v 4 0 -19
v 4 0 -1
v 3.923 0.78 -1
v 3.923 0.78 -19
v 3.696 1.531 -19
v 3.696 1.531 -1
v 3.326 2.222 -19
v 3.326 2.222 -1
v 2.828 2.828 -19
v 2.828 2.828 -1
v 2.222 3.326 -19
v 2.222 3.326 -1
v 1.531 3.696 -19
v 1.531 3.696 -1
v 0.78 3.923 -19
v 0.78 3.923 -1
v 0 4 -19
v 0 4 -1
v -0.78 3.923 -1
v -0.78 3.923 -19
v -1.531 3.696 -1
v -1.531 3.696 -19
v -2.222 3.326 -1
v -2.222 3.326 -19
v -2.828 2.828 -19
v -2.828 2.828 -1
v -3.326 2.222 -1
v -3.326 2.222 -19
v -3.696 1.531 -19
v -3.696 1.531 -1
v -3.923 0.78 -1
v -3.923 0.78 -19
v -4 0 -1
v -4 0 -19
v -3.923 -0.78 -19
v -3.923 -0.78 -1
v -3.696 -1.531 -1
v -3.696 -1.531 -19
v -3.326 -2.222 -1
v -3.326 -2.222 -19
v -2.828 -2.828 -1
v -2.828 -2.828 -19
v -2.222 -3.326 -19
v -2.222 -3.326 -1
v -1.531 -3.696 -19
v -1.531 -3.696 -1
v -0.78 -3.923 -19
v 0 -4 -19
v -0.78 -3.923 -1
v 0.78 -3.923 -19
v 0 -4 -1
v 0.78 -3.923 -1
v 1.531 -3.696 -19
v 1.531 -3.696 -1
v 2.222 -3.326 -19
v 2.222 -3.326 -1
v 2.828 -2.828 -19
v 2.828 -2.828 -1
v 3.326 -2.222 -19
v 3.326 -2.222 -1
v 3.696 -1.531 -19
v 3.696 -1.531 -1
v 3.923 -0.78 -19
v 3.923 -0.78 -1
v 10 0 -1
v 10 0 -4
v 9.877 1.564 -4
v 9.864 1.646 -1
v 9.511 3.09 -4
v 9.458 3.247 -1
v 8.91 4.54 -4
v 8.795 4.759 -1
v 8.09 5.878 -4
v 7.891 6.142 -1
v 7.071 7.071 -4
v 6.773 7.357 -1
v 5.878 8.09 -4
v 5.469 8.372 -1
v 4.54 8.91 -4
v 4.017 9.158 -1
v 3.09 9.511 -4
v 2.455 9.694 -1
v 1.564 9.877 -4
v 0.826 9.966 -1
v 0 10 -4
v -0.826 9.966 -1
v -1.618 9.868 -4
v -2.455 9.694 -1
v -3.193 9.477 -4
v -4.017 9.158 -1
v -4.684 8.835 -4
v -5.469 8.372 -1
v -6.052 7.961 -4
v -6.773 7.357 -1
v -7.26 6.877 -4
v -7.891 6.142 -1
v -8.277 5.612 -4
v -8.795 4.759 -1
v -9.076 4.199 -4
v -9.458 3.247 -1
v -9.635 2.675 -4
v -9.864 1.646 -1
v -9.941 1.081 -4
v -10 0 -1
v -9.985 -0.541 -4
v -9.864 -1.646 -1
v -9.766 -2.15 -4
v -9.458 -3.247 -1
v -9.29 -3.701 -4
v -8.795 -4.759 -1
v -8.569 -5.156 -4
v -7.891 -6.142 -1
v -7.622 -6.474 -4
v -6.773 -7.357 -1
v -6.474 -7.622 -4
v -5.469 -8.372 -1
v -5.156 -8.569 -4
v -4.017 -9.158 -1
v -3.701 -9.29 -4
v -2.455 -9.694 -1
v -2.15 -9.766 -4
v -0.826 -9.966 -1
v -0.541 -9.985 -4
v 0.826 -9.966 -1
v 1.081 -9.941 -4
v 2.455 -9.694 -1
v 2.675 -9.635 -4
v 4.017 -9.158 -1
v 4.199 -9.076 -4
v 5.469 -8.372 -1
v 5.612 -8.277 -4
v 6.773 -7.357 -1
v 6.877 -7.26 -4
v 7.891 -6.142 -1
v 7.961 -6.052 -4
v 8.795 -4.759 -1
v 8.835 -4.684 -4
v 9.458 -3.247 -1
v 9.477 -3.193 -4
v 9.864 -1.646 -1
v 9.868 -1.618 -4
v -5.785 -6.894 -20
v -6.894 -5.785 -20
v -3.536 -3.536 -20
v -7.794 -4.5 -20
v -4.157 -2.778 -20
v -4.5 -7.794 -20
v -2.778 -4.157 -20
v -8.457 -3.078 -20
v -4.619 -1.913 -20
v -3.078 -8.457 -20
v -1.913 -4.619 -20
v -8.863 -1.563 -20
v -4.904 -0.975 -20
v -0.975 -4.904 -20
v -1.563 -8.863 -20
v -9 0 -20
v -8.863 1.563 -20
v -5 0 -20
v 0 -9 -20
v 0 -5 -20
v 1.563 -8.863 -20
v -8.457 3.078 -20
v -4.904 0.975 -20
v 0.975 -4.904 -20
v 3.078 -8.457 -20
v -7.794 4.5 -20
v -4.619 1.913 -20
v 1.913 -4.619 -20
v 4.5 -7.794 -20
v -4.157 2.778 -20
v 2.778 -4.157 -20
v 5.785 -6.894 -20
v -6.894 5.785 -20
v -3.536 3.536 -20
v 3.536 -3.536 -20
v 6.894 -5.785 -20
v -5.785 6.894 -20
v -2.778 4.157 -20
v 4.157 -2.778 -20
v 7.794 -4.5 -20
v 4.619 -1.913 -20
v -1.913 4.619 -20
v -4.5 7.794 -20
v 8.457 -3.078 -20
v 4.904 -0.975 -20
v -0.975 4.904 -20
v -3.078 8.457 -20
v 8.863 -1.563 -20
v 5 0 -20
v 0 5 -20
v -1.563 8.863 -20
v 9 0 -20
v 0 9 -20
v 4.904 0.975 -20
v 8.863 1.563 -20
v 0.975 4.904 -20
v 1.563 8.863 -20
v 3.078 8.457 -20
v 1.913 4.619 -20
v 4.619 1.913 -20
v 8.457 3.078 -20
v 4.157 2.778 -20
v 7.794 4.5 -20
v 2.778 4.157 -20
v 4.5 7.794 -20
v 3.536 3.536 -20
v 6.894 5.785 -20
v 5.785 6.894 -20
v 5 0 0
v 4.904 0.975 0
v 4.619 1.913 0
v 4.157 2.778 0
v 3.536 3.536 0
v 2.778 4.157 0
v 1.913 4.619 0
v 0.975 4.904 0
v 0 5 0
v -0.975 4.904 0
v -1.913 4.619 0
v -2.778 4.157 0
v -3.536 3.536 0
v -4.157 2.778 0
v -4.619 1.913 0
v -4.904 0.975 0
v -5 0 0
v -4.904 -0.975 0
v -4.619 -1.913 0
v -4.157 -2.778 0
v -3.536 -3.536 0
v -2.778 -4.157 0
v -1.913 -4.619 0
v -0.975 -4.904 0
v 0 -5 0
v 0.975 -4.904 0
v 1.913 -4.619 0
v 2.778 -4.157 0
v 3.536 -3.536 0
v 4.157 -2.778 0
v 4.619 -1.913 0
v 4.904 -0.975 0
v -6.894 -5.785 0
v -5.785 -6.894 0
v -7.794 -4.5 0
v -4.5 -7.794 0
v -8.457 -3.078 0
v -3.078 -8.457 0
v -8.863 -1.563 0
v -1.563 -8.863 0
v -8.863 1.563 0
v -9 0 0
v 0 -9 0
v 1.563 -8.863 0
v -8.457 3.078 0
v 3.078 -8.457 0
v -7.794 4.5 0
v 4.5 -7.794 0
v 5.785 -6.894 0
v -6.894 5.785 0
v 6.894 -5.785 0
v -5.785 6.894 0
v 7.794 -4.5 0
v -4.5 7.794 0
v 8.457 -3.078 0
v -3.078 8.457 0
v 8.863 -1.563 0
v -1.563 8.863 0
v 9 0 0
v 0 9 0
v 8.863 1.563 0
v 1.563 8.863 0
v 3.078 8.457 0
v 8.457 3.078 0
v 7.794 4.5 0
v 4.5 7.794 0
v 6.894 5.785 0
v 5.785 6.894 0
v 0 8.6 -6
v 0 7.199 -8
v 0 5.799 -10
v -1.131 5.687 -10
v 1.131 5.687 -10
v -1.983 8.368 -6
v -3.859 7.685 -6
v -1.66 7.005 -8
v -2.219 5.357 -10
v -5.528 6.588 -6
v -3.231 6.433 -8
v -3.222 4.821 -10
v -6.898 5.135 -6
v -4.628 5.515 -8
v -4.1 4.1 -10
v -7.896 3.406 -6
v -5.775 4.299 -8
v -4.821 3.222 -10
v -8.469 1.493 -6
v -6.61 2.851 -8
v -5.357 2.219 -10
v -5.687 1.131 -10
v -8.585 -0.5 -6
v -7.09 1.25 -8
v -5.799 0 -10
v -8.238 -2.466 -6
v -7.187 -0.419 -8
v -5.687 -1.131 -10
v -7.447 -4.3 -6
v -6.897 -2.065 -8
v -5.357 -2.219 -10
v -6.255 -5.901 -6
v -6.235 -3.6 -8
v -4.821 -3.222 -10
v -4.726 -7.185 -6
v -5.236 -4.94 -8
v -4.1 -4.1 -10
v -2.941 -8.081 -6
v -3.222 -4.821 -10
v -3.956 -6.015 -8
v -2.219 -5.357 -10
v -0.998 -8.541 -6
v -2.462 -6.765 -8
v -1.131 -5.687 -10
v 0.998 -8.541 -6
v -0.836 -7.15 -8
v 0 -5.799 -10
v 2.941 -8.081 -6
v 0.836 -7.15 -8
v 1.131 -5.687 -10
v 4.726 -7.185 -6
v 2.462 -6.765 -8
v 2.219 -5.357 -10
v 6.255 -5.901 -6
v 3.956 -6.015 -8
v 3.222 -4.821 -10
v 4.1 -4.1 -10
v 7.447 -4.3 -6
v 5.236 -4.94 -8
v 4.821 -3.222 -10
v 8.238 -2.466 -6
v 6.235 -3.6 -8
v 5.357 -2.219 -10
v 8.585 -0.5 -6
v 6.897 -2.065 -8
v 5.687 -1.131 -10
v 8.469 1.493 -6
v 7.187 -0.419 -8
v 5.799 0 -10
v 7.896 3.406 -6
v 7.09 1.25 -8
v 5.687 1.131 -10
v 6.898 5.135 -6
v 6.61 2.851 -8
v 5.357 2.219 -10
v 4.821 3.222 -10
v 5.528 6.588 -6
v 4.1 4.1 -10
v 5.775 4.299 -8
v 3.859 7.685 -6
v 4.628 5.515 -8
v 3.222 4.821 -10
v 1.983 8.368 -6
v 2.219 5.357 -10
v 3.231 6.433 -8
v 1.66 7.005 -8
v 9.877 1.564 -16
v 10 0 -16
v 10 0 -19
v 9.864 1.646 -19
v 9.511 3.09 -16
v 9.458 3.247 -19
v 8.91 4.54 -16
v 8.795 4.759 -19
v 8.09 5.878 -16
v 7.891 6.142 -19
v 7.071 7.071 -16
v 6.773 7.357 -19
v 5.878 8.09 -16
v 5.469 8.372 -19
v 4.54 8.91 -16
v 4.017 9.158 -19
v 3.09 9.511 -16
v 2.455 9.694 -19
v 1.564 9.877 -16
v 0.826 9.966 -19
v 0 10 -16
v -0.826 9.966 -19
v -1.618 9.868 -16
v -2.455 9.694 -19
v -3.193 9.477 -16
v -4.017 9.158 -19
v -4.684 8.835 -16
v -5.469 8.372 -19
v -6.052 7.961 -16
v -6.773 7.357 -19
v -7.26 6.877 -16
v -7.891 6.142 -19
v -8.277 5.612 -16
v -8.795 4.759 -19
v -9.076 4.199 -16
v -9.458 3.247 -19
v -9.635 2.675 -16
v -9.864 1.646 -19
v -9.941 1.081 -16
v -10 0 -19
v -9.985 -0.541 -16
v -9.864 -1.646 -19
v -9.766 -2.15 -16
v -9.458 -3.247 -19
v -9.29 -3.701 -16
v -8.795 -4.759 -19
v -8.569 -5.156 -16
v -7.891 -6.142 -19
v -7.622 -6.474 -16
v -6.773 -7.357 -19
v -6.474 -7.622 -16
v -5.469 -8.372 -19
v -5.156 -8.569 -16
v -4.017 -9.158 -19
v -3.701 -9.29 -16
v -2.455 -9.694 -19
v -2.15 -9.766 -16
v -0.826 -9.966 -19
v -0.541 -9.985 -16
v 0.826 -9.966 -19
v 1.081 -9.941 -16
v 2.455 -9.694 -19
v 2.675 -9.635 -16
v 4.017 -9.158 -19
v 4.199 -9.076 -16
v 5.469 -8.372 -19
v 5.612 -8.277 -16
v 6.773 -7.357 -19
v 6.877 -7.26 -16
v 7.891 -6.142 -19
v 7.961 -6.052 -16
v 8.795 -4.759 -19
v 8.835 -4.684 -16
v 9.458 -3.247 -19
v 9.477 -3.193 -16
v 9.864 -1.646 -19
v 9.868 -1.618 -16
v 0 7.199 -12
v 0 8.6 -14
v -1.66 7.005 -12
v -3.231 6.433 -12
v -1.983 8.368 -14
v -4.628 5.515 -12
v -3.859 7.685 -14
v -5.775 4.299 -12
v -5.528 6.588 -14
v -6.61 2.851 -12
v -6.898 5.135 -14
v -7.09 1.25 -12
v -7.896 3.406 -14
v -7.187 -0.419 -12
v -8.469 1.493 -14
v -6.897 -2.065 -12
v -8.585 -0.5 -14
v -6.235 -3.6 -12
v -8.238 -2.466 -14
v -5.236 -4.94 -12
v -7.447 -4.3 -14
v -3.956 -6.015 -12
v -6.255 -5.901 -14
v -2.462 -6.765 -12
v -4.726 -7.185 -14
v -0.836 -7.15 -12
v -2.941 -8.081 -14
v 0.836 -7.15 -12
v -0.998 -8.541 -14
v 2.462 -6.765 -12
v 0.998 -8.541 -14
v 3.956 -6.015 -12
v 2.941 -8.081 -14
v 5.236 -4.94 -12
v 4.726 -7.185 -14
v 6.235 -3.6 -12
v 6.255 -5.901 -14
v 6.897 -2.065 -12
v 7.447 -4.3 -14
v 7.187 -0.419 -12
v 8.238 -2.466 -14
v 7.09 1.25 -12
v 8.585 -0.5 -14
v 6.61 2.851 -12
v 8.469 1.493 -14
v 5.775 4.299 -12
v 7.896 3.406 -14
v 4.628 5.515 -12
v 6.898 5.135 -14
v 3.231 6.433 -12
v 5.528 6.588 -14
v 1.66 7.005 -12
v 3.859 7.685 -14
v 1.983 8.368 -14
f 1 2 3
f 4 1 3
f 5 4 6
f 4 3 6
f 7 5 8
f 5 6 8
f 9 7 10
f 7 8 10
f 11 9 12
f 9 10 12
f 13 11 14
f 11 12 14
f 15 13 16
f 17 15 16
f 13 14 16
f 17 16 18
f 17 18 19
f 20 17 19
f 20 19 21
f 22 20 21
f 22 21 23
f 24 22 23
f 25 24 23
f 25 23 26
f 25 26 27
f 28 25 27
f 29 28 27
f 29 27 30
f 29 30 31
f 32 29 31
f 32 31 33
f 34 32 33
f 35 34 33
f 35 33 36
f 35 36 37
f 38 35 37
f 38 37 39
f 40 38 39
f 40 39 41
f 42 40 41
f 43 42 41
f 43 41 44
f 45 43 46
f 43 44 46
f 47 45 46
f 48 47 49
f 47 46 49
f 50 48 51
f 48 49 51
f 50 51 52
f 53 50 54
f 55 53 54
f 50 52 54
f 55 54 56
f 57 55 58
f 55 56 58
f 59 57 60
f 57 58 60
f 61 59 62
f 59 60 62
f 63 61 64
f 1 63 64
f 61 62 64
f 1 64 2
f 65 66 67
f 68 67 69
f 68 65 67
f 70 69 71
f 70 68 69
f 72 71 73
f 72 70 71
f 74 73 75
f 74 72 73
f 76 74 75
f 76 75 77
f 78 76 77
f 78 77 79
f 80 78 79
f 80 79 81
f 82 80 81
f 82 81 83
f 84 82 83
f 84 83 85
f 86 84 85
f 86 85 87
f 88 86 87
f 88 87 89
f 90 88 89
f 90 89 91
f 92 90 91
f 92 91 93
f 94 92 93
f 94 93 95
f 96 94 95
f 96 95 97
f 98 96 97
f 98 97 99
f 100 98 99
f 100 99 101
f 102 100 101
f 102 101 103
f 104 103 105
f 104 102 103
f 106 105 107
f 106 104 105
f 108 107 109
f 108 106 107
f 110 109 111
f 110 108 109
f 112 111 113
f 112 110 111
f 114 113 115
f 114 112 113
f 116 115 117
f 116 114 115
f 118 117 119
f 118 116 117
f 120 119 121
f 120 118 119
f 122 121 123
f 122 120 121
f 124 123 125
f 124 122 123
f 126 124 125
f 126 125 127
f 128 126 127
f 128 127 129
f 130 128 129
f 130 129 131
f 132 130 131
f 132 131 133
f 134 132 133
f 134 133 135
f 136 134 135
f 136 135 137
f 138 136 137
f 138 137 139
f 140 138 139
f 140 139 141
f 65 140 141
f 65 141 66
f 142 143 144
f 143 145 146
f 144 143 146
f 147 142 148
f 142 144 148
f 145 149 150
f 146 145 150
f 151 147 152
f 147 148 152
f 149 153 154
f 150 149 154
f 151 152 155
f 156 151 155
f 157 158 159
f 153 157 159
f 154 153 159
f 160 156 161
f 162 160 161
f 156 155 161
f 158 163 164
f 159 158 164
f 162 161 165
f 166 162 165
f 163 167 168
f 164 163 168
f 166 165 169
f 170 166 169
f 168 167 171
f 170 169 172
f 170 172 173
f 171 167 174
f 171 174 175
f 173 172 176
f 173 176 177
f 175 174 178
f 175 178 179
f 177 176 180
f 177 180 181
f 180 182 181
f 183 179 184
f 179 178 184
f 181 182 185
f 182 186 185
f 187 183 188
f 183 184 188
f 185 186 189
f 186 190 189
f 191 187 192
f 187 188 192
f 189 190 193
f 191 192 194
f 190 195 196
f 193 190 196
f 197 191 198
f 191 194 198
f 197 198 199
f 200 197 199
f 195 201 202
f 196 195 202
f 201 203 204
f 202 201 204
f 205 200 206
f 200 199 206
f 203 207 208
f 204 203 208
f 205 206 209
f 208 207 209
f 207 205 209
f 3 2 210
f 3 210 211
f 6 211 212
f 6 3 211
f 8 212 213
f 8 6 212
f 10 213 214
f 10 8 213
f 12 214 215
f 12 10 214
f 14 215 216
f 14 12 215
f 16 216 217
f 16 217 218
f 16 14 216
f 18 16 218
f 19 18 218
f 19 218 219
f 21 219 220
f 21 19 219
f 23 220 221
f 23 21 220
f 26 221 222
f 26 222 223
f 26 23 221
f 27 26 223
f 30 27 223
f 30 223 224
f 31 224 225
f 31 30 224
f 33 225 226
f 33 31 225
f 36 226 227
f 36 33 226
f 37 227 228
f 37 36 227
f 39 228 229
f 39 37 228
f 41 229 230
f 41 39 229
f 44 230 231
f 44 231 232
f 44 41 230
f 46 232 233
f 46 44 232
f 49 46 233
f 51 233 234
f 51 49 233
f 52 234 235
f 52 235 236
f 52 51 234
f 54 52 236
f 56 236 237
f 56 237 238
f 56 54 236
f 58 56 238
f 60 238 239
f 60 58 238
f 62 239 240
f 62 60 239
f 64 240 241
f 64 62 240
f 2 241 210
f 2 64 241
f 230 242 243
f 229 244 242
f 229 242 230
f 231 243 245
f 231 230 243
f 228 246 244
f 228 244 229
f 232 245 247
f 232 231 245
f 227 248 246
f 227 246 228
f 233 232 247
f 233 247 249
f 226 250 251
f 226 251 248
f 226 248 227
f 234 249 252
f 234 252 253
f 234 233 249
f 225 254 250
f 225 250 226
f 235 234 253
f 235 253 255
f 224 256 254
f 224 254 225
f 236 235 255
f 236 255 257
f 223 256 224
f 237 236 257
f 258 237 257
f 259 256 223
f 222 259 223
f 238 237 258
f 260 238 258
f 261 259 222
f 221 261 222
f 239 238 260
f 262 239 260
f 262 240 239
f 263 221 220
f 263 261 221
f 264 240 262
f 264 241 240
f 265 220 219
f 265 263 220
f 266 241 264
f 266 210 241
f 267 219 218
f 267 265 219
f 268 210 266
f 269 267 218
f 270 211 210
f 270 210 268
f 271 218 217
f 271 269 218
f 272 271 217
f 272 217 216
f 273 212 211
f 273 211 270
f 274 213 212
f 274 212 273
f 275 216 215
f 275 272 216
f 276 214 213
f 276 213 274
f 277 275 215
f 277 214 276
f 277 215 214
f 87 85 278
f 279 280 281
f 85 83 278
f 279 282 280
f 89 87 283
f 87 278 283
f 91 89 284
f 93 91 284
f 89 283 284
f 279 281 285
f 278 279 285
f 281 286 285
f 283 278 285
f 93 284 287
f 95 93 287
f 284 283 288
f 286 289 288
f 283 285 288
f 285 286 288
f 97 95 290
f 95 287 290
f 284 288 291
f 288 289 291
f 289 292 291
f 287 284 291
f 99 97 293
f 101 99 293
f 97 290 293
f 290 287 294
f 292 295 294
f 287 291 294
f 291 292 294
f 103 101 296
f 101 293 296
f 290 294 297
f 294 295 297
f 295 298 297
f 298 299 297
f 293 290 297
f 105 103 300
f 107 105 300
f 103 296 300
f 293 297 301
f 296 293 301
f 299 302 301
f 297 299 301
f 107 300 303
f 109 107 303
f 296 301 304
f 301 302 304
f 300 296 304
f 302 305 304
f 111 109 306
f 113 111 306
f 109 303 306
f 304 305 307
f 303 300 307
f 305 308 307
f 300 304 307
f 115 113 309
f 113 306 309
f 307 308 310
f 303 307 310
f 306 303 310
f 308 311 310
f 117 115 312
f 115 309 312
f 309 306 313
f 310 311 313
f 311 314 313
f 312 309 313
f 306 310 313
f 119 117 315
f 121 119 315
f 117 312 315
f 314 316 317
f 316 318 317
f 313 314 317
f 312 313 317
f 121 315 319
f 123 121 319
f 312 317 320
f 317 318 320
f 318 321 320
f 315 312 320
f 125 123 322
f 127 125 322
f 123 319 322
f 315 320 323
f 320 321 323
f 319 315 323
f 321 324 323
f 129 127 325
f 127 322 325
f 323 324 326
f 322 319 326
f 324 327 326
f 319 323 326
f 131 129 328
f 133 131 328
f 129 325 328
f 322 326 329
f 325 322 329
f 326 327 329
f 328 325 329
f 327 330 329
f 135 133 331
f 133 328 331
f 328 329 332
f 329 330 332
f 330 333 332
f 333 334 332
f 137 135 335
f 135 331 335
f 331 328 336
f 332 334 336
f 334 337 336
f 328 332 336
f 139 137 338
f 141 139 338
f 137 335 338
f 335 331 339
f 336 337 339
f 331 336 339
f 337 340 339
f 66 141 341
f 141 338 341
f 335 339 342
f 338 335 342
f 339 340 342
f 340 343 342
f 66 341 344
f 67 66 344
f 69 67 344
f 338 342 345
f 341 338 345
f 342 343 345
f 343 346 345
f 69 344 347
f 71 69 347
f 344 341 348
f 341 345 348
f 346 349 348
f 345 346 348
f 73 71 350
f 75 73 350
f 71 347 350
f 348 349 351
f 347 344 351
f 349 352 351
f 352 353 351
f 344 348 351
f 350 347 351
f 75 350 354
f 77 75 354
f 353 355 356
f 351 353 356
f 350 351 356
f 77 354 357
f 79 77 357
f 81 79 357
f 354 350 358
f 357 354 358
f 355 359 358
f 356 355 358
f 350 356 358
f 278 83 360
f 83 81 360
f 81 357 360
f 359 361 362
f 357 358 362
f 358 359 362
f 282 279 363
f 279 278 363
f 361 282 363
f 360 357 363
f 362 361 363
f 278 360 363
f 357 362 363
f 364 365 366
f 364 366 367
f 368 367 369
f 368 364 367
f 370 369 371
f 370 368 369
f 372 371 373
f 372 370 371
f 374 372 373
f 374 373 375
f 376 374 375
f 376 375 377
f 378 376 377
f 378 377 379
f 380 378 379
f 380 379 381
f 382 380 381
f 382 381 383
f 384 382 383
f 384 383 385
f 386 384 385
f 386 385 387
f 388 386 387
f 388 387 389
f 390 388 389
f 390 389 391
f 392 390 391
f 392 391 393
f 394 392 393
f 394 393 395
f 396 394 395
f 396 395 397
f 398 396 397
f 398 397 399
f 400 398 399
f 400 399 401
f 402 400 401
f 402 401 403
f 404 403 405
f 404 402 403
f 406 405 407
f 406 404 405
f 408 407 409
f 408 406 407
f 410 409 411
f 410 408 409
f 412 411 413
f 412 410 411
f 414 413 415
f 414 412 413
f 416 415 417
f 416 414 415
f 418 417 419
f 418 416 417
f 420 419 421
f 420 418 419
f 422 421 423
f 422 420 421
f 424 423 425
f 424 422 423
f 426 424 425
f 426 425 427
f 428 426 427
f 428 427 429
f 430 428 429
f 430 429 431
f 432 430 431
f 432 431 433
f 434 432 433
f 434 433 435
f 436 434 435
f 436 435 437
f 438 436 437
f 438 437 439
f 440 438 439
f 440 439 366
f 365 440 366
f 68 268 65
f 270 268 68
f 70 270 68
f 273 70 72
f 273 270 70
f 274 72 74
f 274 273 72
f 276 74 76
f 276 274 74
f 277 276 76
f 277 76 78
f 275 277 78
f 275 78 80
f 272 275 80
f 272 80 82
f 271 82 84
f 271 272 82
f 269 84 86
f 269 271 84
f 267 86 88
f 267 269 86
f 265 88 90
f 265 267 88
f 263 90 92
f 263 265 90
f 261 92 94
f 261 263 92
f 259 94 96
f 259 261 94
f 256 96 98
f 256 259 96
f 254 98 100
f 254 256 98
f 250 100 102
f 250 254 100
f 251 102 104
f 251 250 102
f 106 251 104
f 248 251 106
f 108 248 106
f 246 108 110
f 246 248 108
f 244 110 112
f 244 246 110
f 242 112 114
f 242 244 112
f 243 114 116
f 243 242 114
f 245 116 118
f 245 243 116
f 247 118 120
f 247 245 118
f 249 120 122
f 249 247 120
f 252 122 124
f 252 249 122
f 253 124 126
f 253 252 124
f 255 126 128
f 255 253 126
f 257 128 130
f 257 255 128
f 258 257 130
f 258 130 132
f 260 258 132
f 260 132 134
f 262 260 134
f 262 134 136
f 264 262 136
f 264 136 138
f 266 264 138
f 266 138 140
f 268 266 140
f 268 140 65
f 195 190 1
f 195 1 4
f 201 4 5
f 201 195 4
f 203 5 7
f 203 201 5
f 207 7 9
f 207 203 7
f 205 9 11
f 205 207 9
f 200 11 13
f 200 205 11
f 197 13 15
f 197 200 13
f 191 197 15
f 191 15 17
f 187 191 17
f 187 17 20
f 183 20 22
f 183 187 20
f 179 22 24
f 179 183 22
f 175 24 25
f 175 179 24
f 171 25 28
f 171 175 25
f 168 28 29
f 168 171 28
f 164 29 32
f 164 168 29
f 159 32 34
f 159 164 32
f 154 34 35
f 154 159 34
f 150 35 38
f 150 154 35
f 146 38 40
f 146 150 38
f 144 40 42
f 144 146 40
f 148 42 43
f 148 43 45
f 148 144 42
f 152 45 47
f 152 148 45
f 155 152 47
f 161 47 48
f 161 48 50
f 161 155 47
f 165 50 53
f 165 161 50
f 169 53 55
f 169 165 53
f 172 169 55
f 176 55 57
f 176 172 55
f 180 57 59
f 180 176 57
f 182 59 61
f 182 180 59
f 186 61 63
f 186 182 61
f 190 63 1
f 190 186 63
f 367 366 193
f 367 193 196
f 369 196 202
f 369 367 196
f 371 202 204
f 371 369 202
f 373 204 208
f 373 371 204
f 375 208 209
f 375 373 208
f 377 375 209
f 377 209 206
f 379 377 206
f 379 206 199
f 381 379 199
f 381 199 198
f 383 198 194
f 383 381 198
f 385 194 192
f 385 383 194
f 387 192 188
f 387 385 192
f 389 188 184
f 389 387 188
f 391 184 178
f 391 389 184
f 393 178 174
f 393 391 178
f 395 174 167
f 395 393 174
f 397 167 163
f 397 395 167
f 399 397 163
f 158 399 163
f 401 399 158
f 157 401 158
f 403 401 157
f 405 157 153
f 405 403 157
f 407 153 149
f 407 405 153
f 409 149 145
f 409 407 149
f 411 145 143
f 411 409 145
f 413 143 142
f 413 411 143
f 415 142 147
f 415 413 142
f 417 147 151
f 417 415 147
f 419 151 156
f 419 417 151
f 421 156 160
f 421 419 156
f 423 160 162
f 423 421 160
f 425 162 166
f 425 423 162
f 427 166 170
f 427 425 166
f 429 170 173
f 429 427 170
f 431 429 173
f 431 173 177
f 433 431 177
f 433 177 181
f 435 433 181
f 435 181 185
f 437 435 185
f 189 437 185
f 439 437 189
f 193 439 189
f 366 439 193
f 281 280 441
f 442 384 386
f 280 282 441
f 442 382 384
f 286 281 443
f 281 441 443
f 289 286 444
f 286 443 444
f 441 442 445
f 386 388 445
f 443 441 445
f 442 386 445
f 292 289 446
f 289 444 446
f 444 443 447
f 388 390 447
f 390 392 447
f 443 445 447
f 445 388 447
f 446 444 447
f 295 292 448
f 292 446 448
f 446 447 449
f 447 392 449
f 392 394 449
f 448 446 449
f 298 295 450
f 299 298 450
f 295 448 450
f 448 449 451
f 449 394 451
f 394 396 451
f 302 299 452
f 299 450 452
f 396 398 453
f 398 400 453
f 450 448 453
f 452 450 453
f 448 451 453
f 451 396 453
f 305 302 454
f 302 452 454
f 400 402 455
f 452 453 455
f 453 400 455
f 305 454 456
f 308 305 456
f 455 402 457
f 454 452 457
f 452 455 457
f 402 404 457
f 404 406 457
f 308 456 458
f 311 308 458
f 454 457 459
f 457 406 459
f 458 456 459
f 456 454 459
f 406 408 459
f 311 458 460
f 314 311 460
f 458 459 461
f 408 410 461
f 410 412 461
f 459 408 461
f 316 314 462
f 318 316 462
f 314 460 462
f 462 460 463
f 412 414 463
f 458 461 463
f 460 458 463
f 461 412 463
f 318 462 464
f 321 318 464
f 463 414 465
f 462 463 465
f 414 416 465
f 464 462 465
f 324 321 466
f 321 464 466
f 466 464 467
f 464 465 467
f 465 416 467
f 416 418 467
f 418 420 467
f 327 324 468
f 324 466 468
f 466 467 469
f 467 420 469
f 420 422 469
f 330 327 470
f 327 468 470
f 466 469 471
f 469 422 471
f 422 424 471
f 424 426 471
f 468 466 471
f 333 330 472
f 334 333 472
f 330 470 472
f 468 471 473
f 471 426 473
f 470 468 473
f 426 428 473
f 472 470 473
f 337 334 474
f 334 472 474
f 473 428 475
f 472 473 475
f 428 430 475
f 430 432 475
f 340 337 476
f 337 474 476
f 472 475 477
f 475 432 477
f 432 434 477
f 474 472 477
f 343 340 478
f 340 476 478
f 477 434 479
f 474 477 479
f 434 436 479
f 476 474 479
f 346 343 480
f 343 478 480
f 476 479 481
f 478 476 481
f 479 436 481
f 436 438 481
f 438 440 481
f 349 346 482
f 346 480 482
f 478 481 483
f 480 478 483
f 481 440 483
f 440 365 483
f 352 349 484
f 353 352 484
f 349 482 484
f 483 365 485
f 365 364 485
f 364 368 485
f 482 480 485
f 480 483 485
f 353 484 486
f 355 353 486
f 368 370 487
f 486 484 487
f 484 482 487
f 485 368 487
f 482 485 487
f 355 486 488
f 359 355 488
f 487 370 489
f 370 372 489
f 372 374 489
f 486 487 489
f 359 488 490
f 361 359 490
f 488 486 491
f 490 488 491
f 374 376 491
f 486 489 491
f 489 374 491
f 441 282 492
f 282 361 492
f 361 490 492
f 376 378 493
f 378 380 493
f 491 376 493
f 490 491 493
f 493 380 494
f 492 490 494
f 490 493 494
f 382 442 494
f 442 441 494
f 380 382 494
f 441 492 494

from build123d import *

# Parameters (mm, degrees)
F0_R     = 10
F1_DEPTH = 20
F5_R     = 4
F6_DEPTH = 25
F7_SIZE  = 1


with BuildPart() as f1:
    # F0 (on Top) → F1 (new body)
    with BuildSketch(Plane.XY):
        Circle(F0_R)
    extrude(amount=-F1_DEPTH)

    # F2 (on Right) → F3 (revolve, cut)
    with BuildSketch(Plane.YZ):
        Polygon((10, -16), (10, -4), (5.7987547707, -10), align=None)
    revolve(axis=Axis((0, 0, 0), (0, 0, 1)), mode=Mode.SUBTRACT)

    # F5 (on face) → F6 (cut)
    with BuildSketch(Plane.XY):
        Circle(F5_R)
    extrude(amount=-F6_DEPTH, mode=Mode.SUBTRACT)

    # F7
    f7_edges = [f1.edges().sort_by_distance(p)[0] for p in [
        (-4, 0, -20),
        (-10, 0, -20),
        (-10, 0, 0),
        (-4, 0, 0),
    ]]
    chamfer(f7_edges, length=F7_SIZE)


solid = f1.part
